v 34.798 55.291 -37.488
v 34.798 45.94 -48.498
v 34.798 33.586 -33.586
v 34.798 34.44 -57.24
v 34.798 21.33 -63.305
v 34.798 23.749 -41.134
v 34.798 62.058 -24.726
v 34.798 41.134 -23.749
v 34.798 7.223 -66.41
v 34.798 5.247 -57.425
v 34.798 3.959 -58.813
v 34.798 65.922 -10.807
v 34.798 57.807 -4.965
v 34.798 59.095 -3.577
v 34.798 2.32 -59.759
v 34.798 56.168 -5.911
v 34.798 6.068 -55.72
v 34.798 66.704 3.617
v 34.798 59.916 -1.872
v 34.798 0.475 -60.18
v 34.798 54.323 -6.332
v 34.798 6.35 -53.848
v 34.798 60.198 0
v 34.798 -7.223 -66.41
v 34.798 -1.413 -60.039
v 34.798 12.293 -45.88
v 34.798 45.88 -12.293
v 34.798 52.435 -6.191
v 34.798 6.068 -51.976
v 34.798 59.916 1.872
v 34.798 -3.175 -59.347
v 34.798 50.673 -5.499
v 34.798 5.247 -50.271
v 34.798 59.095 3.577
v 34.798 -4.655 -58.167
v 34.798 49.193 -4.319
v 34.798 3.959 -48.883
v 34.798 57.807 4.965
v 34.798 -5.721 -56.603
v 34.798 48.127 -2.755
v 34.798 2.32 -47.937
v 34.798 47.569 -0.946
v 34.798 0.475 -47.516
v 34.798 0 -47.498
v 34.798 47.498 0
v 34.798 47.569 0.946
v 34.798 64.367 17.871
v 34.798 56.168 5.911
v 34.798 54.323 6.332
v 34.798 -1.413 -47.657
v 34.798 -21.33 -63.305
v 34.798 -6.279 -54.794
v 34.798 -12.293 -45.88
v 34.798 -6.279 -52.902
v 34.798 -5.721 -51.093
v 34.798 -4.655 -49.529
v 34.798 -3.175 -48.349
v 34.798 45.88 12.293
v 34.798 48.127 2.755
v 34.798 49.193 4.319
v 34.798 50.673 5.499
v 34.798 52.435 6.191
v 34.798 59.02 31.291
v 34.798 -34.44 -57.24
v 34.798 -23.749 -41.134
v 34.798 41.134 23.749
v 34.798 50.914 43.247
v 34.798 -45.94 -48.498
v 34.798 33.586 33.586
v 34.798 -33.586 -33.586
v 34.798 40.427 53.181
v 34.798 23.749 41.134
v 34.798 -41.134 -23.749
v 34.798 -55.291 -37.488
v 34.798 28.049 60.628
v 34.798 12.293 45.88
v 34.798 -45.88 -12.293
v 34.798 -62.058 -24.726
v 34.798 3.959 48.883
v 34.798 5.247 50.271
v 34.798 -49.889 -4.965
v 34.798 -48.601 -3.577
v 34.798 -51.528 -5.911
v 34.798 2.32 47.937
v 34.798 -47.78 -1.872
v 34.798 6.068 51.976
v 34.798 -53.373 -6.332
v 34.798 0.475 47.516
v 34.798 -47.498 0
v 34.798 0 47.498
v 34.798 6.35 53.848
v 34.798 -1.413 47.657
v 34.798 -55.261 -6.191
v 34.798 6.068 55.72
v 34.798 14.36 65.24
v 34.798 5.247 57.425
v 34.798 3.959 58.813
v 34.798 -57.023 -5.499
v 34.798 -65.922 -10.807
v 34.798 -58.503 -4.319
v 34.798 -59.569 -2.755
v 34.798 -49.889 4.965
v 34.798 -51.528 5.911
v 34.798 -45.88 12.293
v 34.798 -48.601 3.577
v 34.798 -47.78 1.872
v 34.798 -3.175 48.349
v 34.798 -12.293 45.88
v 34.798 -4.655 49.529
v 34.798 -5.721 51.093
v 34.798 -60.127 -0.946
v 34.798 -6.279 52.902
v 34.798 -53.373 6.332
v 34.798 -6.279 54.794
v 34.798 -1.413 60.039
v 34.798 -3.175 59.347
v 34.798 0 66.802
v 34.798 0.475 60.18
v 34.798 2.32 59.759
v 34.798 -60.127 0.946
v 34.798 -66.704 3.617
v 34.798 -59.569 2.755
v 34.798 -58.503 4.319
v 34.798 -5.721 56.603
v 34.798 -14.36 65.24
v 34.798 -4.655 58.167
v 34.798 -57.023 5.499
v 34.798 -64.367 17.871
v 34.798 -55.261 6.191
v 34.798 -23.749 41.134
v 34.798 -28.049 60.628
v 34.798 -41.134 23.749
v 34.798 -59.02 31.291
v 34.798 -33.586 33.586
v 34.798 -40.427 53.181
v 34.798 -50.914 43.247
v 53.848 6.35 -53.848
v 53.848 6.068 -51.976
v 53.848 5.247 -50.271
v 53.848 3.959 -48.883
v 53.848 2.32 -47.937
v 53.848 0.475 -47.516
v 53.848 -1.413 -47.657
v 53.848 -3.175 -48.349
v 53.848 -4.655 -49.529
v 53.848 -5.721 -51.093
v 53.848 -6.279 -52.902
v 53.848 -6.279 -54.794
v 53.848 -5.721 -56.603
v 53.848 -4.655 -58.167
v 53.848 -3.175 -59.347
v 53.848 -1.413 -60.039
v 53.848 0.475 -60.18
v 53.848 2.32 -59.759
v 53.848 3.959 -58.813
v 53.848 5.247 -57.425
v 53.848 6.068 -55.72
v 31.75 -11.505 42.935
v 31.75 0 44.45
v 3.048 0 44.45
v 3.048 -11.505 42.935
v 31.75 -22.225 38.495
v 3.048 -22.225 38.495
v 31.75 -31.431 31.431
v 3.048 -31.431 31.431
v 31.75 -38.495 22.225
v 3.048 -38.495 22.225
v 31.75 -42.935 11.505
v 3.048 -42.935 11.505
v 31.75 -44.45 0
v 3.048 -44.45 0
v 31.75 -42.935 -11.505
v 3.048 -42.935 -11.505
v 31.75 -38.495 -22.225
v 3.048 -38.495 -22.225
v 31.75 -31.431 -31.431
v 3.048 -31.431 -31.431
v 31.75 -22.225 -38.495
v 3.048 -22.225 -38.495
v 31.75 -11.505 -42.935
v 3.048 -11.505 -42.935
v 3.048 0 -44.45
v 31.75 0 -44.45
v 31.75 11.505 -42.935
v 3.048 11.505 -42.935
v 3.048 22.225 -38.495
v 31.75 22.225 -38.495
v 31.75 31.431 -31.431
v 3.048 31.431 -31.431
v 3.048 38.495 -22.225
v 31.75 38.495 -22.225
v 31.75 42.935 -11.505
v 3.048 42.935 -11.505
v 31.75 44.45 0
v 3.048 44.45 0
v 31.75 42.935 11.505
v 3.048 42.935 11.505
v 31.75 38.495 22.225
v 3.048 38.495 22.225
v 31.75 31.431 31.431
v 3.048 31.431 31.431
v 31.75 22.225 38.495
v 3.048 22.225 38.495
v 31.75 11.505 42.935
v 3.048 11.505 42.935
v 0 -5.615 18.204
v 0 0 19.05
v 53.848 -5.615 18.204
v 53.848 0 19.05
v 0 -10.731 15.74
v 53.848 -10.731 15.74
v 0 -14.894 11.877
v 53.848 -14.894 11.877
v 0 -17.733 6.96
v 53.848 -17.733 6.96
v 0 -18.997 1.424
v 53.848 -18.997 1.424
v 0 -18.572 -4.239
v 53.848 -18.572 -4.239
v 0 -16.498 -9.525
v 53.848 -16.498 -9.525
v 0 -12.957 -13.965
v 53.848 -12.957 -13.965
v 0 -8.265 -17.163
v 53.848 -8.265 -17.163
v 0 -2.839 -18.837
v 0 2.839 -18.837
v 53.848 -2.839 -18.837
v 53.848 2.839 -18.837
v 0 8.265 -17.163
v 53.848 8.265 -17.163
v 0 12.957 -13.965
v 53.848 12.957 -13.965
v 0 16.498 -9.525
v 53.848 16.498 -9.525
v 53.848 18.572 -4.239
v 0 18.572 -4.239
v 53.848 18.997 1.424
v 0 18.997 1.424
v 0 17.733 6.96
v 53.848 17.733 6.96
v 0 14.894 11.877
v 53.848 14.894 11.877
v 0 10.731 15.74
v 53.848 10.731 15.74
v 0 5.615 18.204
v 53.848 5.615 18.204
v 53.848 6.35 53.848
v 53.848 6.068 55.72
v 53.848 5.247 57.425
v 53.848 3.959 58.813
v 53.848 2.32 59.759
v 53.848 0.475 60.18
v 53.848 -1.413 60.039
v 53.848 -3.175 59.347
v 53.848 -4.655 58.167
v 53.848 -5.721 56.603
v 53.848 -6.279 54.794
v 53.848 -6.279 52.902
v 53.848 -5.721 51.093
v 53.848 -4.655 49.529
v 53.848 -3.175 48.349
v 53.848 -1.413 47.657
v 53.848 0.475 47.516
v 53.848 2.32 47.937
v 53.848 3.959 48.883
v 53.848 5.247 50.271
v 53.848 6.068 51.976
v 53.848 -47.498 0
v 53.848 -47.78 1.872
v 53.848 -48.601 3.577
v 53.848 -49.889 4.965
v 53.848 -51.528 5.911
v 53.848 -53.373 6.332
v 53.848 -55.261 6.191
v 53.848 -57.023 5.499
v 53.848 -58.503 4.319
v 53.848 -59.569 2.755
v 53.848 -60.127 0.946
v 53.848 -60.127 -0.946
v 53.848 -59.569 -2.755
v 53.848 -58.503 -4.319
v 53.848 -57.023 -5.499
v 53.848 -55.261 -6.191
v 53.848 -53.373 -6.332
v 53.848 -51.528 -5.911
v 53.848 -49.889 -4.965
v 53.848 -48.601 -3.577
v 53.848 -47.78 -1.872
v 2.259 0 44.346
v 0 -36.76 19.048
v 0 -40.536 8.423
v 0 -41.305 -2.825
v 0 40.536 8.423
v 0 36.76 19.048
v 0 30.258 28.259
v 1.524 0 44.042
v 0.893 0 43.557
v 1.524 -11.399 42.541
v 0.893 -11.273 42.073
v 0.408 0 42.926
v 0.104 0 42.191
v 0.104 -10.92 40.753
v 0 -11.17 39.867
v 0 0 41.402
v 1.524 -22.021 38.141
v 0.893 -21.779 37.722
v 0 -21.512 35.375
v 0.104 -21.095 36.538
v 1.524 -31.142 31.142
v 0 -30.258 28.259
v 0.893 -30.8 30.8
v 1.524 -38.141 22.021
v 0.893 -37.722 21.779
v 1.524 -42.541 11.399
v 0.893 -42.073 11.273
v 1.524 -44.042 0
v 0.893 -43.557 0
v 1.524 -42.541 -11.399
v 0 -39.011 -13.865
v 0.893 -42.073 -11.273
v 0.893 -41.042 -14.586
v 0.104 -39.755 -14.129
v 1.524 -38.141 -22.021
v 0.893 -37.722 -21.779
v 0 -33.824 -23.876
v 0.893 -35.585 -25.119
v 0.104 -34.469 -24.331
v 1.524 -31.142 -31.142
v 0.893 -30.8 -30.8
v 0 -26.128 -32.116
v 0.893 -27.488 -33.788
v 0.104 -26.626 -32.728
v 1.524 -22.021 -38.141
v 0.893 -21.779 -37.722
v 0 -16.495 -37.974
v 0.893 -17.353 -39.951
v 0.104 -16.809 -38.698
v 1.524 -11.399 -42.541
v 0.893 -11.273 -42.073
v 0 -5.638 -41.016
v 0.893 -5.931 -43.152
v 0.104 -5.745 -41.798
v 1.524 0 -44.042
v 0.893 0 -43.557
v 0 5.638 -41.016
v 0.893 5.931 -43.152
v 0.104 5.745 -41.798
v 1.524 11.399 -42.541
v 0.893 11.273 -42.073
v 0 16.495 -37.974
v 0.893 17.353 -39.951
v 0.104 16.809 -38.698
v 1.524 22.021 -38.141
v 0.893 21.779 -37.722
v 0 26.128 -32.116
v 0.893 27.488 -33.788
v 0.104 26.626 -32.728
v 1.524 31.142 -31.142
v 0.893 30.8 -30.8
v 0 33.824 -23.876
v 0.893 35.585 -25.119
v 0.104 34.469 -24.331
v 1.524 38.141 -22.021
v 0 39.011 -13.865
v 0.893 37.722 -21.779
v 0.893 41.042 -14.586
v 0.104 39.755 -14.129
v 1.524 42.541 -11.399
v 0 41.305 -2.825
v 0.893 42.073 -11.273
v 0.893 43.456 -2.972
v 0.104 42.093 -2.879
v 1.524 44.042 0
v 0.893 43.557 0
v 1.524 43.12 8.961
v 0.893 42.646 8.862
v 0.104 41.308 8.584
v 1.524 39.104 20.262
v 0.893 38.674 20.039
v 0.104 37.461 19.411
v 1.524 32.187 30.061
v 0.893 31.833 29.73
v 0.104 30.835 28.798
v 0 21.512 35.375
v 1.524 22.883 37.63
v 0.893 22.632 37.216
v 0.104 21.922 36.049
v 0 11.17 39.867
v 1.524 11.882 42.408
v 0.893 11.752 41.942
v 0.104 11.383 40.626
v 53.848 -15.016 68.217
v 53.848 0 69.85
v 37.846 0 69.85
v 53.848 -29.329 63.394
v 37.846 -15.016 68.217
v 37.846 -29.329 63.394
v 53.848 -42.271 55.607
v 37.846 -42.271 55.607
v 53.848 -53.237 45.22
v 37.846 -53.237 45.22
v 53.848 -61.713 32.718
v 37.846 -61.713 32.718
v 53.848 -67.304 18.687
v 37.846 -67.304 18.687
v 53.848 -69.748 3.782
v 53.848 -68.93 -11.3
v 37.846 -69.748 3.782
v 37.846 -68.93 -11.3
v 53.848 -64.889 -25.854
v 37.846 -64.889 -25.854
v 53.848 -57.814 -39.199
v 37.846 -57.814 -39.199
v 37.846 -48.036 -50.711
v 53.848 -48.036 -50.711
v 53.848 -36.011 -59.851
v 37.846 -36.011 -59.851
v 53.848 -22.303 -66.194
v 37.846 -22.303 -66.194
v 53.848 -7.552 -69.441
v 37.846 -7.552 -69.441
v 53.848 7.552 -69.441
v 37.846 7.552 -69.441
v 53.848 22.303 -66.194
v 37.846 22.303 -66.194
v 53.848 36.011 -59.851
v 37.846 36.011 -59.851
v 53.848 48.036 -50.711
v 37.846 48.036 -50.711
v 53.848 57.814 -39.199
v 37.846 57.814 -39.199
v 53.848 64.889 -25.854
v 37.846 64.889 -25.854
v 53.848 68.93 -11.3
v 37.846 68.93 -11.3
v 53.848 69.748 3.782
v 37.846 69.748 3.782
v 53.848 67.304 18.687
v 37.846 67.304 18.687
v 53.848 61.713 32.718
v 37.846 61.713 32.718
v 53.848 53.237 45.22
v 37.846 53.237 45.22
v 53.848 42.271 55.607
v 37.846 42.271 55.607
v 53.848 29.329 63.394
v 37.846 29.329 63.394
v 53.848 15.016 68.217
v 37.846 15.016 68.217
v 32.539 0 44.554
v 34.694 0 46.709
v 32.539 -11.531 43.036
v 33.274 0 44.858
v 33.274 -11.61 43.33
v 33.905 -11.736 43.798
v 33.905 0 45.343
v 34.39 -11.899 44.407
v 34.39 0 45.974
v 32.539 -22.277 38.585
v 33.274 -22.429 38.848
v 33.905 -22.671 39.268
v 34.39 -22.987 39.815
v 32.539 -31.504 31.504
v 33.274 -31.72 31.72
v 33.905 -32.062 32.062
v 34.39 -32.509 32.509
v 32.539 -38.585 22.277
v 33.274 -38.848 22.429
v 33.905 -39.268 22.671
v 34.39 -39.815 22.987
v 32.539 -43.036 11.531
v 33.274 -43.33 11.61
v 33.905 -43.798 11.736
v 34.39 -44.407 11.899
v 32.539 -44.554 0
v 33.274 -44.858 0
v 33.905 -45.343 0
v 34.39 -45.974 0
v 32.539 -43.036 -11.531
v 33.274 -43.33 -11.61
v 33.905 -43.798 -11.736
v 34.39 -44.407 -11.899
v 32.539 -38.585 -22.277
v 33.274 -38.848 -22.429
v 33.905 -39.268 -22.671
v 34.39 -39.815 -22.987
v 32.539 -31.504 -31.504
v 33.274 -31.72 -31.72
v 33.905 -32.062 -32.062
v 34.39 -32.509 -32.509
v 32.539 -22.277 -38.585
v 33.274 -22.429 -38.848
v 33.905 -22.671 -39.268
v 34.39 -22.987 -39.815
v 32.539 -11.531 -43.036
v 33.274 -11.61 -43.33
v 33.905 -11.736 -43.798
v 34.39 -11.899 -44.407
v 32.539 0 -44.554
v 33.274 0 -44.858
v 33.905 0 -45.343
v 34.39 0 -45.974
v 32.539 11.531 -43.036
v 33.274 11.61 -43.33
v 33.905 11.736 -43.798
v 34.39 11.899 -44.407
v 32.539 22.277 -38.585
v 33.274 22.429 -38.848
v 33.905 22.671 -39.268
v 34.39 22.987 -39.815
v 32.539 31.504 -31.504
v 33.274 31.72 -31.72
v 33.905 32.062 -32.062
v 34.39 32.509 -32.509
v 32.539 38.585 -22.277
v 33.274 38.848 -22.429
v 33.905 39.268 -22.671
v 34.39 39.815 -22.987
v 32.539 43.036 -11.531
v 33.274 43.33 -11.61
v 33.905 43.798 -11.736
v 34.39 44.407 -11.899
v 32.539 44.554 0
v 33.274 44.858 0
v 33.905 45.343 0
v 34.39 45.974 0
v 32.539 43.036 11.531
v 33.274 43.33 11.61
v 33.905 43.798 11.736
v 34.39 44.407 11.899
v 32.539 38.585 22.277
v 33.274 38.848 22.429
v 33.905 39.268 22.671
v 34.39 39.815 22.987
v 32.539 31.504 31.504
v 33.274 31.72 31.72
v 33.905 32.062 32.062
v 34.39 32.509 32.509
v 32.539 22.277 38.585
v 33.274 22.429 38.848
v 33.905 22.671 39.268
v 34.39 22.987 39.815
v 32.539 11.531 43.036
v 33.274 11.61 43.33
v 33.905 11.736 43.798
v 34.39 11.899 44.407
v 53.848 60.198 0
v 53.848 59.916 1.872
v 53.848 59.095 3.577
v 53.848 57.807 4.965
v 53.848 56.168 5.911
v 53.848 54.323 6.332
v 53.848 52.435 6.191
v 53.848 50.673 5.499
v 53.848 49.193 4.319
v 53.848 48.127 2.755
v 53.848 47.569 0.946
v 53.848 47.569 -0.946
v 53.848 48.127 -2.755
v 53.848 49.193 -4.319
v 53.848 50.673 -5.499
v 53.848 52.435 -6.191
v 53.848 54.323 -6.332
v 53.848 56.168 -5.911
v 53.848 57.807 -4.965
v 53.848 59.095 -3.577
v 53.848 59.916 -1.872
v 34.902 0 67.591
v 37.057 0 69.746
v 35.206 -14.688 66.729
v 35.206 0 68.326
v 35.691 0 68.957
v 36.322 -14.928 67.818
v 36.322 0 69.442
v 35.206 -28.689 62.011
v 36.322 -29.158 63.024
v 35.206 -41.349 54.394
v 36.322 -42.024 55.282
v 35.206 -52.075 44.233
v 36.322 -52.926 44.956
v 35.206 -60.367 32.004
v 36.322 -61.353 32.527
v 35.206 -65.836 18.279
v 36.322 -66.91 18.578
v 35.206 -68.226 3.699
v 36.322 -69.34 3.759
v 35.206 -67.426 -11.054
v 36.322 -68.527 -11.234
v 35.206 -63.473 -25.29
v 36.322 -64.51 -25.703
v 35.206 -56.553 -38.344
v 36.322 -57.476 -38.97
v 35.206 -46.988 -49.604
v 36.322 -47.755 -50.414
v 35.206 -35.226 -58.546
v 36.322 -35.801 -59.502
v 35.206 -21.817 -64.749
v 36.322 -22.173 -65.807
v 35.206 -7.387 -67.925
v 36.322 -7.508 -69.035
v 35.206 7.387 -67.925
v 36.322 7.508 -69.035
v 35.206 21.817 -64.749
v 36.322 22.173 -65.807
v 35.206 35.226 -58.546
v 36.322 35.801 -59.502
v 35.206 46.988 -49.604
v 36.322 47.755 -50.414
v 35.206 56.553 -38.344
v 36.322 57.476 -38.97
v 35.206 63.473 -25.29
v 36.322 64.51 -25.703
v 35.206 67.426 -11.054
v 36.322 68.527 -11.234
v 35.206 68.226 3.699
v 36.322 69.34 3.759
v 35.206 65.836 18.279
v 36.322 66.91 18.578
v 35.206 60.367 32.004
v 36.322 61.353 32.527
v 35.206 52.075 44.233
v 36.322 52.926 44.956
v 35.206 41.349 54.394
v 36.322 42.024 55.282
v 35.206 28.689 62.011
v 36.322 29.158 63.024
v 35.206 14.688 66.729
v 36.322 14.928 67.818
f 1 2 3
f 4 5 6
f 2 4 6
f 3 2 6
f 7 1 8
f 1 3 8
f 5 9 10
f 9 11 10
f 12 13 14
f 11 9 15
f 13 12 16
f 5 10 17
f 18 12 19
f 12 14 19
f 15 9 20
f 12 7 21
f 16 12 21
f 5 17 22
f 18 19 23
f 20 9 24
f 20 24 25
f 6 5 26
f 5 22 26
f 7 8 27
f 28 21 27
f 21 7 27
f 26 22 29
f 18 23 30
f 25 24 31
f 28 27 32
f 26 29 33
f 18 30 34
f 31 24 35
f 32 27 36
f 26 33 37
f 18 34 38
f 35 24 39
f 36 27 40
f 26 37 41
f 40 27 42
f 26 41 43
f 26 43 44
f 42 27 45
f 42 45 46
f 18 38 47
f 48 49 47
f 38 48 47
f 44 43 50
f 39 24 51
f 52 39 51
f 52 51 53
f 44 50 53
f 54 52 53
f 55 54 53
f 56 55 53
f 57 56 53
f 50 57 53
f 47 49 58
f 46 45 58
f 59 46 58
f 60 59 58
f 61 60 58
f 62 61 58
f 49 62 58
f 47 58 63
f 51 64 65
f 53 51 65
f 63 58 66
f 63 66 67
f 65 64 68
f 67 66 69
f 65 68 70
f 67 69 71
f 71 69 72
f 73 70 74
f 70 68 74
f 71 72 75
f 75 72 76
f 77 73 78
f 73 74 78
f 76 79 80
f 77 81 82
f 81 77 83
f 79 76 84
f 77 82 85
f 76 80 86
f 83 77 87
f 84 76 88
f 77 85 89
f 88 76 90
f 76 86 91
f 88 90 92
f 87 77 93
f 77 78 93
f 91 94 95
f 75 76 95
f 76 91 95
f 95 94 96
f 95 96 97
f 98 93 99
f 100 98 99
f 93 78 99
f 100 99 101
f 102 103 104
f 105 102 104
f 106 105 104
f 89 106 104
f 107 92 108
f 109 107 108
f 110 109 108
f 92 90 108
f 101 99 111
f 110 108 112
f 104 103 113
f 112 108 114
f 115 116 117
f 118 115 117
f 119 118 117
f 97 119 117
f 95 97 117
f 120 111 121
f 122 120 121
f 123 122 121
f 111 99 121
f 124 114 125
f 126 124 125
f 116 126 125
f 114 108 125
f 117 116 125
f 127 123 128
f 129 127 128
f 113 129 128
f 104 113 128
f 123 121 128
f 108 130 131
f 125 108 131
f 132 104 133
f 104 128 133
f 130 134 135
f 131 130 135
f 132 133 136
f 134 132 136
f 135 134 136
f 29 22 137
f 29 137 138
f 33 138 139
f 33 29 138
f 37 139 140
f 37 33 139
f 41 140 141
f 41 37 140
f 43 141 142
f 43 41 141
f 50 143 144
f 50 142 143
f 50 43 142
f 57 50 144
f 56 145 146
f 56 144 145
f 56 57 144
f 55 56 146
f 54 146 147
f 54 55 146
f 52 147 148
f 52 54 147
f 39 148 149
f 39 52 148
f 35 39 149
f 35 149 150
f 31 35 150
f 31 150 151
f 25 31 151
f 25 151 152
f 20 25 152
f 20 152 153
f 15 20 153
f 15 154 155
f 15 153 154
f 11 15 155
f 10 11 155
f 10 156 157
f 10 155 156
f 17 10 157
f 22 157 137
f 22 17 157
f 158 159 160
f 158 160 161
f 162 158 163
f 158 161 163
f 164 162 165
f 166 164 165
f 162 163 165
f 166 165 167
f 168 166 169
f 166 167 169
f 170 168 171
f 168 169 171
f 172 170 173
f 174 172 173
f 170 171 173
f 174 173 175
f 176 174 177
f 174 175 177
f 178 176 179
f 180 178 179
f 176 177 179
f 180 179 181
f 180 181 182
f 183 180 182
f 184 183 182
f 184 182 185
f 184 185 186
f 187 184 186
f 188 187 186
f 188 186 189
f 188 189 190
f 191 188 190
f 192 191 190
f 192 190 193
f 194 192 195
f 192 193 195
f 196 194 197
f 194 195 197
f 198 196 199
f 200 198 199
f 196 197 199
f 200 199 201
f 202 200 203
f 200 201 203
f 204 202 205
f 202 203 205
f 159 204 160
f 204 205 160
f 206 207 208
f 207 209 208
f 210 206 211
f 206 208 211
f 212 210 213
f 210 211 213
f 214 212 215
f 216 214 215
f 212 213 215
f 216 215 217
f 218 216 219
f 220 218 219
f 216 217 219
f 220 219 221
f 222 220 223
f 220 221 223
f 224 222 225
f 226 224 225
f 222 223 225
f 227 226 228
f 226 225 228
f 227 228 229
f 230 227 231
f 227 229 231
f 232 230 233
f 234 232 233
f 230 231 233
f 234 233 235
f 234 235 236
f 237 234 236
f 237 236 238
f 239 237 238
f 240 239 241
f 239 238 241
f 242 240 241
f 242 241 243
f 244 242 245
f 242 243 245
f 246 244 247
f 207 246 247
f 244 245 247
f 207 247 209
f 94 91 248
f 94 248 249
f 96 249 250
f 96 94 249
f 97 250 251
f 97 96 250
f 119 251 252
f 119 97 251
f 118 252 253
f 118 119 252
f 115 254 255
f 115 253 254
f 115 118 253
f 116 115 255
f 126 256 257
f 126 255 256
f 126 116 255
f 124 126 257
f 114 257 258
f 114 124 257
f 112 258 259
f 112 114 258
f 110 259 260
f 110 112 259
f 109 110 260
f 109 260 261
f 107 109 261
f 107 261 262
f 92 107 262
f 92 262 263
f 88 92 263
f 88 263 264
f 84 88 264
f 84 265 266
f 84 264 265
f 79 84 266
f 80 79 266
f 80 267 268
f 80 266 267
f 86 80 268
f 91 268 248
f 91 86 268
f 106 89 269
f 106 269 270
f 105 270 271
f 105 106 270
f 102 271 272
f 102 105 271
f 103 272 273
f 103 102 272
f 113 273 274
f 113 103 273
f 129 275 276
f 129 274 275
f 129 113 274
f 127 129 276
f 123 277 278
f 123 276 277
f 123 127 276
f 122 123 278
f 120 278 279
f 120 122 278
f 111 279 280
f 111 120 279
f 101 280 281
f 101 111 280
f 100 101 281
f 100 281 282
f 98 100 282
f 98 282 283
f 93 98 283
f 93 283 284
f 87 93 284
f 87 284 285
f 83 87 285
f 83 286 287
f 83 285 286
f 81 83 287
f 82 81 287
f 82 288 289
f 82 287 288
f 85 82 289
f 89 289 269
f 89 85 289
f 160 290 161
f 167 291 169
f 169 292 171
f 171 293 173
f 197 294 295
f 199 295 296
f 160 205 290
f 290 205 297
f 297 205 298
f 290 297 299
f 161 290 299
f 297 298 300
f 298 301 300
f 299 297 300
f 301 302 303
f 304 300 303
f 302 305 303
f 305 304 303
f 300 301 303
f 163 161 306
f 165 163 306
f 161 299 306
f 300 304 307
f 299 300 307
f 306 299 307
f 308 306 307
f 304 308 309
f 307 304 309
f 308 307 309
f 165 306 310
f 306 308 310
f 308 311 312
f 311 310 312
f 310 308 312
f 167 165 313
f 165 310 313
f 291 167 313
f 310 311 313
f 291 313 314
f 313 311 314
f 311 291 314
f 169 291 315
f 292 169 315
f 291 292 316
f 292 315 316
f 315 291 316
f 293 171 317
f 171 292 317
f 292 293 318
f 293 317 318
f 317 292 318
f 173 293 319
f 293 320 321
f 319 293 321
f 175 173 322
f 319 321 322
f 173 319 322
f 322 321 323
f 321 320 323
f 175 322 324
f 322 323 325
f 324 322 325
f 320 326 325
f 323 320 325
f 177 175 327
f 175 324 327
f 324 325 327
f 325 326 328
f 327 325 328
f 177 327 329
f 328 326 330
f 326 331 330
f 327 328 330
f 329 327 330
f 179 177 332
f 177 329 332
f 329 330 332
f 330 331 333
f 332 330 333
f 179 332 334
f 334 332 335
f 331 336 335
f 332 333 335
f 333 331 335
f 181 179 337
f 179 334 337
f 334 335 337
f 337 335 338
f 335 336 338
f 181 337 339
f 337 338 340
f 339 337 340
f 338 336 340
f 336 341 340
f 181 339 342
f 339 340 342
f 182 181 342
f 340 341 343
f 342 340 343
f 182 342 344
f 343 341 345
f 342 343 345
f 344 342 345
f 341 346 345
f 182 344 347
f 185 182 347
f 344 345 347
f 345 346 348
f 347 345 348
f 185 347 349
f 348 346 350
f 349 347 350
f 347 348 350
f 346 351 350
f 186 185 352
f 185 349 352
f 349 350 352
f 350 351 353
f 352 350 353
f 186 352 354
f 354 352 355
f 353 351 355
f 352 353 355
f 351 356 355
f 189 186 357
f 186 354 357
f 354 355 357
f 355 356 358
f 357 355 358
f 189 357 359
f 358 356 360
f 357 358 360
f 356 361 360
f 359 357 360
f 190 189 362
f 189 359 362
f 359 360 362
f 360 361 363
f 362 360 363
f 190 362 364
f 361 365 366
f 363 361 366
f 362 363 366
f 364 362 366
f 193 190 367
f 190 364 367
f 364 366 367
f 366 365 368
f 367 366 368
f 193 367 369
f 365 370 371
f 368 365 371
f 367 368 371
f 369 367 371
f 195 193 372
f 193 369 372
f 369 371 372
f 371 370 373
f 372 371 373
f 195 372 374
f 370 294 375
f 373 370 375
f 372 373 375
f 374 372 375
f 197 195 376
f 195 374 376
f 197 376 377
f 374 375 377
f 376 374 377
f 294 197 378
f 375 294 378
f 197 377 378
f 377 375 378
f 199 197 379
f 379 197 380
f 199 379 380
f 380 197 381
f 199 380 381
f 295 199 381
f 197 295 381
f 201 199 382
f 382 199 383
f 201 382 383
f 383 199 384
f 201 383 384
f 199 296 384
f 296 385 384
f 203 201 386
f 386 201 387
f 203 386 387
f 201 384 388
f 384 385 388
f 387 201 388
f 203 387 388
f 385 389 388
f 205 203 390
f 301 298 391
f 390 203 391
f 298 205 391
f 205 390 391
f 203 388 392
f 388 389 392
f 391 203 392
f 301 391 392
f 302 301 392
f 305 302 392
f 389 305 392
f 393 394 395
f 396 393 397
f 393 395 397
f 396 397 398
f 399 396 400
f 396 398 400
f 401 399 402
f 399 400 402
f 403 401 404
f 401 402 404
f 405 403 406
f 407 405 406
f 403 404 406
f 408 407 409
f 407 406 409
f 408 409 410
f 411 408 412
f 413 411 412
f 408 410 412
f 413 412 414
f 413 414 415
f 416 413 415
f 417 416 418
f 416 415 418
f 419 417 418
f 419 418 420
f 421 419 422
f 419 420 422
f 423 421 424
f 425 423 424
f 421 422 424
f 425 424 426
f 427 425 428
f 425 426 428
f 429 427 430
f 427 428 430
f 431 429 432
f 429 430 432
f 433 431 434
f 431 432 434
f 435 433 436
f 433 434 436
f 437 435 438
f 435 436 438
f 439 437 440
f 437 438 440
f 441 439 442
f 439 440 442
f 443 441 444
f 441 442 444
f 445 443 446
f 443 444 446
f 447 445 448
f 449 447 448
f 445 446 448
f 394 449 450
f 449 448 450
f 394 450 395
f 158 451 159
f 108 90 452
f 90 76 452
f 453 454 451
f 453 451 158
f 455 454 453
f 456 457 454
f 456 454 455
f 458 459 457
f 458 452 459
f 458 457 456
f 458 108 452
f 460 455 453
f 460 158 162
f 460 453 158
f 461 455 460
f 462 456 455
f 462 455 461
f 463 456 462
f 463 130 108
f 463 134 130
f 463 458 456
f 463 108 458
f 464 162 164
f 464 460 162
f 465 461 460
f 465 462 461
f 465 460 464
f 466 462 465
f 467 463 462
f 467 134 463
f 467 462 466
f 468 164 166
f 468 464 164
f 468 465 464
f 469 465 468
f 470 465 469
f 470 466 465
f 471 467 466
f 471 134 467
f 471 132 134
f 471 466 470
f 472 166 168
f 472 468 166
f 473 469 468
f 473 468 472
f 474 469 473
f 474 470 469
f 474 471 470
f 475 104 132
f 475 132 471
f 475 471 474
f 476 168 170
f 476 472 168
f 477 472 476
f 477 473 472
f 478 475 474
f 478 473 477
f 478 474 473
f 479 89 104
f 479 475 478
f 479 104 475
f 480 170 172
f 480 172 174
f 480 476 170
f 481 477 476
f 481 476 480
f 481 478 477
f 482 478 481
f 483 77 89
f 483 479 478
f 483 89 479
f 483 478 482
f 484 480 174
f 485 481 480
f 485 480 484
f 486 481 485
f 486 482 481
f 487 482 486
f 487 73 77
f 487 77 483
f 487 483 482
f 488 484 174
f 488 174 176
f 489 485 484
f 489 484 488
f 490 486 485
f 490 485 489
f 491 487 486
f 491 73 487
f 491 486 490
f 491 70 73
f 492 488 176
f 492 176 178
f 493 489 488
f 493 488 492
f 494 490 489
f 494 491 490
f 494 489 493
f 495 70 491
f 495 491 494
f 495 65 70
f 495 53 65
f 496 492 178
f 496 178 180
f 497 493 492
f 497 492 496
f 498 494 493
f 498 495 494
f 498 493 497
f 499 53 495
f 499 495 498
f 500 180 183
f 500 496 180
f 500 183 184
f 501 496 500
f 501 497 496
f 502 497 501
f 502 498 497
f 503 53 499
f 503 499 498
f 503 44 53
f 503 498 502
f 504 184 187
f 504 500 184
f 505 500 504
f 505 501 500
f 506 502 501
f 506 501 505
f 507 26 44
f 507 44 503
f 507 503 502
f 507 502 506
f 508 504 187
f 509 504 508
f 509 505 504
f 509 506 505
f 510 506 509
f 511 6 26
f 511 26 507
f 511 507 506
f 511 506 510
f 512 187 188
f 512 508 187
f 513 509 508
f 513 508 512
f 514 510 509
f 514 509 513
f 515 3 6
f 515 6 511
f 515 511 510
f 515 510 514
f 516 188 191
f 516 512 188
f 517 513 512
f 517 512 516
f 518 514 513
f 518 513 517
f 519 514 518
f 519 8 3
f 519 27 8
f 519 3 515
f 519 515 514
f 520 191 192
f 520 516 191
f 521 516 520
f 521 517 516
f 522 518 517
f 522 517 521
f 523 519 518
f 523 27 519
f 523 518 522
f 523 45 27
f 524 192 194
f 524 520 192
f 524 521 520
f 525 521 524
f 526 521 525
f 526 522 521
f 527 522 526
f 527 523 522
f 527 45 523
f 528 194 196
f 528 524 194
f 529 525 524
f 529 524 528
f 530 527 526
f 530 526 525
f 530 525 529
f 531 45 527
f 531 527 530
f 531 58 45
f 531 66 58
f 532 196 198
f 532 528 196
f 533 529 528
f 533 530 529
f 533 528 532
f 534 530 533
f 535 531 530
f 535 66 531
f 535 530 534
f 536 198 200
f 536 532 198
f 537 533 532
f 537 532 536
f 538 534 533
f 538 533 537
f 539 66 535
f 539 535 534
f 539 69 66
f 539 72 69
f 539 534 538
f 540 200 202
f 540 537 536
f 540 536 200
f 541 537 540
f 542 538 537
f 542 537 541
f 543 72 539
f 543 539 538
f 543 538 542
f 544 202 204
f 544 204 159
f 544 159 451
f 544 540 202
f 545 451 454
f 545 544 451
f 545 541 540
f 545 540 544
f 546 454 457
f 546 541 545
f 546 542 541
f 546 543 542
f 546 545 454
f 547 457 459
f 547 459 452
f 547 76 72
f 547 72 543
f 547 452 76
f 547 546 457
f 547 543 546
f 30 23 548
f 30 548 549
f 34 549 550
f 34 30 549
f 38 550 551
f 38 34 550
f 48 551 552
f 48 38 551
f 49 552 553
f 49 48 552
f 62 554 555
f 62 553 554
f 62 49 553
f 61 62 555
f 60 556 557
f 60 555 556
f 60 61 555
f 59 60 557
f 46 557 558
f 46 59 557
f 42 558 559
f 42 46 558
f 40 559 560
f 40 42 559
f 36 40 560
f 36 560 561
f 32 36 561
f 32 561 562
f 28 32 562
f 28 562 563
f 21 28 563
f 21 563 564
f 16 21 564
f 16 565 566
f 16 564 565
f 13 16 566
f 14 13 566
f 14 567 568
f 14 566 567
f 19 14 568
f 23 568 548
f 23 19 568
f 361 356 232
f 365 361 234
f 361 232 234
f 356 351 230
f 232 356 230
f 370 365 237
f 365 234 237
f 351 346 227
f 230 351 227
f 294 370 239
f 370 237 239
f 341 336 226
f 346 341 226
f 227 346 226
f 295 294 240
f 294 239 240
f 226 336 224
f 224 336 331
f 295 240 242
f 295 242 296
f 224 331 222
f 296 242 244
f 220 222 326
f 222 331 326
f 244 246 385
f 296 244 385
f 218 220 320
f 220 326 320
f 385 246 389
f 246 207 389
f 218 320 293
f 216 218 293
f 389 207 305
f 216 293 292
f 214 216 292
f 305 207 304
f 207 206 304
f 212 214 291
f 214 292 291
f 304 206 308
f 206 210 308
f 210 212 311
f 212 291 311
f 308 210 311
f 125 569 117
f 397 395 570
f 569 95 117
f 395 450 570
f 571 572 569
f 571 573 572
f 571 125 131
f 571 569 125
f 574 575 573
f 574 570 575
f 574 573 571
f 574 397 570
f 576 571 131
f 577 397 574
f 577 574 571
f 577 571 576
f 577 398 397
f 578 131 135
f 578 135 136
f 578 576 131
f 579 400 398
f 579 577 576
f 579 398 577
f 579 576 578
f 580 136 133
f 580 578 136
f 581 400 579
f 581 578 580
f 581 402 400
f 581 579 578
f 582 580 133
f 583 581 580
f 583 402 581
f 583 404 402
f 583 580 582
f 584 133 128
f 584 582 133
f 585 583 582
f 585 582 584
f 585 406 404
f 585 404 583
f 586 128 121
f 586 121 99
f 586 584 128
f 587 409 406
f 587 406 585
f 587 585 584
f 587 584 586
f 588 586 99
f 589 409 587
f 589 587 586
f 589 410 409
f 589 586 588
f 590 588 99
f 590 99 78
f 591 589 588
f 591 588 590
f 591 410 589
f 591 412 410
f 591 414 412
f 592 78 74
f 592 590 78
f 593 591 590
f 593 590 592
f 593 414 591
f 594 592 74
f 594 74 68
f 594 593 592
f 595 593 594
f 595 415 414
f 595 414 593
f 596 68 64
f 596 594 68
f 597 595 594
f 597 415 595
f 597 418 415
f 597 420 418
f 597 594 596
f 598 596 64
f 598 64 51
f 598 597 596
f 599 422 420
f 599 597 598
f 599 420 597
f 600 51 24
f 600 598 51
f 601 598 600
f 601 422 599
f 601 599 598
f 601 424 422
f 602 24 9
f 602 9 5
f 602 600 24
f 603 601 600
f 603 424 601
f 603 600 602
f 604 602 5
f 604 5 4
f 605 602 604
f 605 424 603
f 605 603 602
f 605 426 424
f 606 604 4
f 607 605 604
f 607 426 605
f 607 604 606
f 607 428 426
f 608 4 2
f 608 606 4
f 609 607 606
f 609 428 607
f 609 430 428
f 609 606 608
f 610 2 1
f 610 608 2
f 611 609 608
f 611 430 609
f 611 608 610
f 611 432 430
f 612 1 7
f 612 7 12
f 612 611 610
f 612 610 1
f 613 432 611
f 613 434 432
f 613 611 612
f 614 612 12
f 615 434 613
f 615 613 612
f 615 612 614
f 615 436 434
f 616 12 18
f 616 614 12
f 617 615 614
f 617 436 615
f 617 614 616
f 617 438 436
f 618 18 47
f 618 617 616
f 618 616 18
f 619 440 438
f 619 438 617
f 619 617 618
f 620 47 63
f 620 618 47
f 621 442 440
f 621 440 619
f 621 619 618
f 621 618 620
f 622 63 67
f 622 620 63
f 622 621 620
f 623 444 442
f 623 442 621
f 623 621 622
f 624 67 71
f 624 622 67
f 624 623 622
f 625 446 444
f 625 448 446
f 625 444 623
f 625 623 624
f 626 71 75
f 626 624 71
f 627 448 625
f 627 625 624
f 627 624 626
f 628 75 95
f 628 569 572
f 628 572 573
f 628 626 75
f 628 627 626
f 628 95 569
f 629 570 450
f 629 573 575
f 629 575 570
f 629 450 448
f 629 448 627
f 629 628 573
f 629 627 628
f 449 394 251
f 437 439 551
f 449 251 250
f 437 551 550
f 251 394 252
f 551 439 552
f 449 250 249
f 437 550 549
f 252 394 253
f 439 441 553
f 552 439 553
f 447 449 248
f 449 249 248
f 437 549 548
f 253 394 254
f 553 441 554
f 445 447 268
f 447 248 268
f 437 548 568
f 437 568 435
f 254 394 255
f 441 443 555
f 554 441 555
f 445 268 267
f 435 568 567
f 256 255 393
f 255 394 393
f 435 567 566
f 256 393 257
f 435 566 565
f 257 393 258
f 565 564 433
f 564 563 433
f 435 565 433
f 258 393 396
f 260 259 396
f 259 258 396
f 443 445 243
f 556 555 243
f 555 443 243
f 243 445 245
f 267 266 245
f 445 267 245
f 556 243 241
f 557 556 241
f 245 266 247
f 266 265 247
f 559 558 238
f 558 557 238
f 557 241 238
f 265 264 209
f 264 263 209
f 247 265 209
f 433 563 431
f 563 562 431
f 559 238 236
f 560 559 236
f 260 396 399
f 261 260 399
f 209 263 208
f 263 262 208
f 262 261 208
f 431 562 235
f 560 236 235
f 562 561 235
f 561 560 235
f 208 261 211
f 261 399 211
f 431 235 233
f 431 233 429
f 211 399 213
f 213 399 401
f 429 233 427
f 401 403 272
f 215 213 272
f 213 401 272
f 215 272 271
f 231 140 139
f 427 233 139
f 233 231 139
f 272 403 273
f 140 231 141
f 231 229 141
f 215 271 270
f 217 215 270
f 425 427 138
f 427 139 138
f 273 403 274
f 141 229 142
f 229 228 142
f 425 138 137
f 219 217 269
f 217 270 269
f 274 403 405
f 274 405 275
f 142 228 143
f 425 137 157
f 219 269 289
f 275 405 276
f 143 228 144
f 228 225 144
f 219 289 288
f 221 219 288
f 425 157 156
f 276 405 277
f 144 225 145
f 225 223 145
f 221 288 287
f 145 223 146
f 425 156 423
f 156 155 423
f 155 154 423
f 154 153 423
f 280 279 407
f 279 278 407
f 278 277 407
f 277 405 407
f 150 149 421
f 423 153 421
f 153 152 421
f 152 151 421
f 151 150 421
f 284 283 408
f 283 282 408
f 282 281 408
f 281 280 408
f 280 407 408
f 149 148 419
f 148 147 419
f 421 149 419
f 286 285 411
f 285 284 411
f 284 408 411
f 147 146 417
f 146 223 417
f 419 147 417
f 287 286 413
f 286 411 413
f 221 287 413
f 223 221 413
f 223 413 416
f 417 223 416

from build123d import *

# Parameters (mm, degrees)
F2_R     = 6.35
F3_DEPTH = 53.849
F4_R     = 3.04799
F5_R     = 3.048


# Not quite as in the source:
# - a fillet or chamfer is up to 0.001 mm smaller than in the source, because OpenCascade refuses the exact size


with BuildPart() as f1:
    # F0 (on Front) → F1 (revolve)
    with BuildSketch(Plane.XZ):
        Polygon((0, 44.45), (0, 19.05), (53.848, 19.05), (53.848, 69.85), (34.798, 69.85), (34.798, 44.45), align=None)
    revolve(axis=Axis((45.7144924702, 0, 0), (1, 0, 0)))

    # F2 (on Right) → F3 (cut, through all)
    with BuildSketch(Plane.YZ):
        with Locations((0, 53.848)):
            Circle(F2_R)
        with Locations((53.848, 0)):
            Circle(F2_R)
        with Locations((-53.848, 0)):
            Circle(F2_R)
        with Locations((0, -53.848)):
            Circle(F2_R)
    extrude(amount=F3_DEPTH, mode=Mode.SUBTRACT)

    # F4 (radius 3.048 in the source; OpenCascade refuses exactly that, so slightly less here)
    f4_edges = [f1.edges().sort_by_distance(p)[0] for p in [
        (34.798, 0, -44.45),
    ]]
    fillet(f4_edges, radius=F4_R)

    # F5
    f5_edges = [f1.edges().sort_by_distance(p)[0] for p in [
        (0, 0, -44.45),
        (34.798, 0, -69.85),
    ]]
    fillet(f5_edges, radius=F5_R)


solid = f1.part
